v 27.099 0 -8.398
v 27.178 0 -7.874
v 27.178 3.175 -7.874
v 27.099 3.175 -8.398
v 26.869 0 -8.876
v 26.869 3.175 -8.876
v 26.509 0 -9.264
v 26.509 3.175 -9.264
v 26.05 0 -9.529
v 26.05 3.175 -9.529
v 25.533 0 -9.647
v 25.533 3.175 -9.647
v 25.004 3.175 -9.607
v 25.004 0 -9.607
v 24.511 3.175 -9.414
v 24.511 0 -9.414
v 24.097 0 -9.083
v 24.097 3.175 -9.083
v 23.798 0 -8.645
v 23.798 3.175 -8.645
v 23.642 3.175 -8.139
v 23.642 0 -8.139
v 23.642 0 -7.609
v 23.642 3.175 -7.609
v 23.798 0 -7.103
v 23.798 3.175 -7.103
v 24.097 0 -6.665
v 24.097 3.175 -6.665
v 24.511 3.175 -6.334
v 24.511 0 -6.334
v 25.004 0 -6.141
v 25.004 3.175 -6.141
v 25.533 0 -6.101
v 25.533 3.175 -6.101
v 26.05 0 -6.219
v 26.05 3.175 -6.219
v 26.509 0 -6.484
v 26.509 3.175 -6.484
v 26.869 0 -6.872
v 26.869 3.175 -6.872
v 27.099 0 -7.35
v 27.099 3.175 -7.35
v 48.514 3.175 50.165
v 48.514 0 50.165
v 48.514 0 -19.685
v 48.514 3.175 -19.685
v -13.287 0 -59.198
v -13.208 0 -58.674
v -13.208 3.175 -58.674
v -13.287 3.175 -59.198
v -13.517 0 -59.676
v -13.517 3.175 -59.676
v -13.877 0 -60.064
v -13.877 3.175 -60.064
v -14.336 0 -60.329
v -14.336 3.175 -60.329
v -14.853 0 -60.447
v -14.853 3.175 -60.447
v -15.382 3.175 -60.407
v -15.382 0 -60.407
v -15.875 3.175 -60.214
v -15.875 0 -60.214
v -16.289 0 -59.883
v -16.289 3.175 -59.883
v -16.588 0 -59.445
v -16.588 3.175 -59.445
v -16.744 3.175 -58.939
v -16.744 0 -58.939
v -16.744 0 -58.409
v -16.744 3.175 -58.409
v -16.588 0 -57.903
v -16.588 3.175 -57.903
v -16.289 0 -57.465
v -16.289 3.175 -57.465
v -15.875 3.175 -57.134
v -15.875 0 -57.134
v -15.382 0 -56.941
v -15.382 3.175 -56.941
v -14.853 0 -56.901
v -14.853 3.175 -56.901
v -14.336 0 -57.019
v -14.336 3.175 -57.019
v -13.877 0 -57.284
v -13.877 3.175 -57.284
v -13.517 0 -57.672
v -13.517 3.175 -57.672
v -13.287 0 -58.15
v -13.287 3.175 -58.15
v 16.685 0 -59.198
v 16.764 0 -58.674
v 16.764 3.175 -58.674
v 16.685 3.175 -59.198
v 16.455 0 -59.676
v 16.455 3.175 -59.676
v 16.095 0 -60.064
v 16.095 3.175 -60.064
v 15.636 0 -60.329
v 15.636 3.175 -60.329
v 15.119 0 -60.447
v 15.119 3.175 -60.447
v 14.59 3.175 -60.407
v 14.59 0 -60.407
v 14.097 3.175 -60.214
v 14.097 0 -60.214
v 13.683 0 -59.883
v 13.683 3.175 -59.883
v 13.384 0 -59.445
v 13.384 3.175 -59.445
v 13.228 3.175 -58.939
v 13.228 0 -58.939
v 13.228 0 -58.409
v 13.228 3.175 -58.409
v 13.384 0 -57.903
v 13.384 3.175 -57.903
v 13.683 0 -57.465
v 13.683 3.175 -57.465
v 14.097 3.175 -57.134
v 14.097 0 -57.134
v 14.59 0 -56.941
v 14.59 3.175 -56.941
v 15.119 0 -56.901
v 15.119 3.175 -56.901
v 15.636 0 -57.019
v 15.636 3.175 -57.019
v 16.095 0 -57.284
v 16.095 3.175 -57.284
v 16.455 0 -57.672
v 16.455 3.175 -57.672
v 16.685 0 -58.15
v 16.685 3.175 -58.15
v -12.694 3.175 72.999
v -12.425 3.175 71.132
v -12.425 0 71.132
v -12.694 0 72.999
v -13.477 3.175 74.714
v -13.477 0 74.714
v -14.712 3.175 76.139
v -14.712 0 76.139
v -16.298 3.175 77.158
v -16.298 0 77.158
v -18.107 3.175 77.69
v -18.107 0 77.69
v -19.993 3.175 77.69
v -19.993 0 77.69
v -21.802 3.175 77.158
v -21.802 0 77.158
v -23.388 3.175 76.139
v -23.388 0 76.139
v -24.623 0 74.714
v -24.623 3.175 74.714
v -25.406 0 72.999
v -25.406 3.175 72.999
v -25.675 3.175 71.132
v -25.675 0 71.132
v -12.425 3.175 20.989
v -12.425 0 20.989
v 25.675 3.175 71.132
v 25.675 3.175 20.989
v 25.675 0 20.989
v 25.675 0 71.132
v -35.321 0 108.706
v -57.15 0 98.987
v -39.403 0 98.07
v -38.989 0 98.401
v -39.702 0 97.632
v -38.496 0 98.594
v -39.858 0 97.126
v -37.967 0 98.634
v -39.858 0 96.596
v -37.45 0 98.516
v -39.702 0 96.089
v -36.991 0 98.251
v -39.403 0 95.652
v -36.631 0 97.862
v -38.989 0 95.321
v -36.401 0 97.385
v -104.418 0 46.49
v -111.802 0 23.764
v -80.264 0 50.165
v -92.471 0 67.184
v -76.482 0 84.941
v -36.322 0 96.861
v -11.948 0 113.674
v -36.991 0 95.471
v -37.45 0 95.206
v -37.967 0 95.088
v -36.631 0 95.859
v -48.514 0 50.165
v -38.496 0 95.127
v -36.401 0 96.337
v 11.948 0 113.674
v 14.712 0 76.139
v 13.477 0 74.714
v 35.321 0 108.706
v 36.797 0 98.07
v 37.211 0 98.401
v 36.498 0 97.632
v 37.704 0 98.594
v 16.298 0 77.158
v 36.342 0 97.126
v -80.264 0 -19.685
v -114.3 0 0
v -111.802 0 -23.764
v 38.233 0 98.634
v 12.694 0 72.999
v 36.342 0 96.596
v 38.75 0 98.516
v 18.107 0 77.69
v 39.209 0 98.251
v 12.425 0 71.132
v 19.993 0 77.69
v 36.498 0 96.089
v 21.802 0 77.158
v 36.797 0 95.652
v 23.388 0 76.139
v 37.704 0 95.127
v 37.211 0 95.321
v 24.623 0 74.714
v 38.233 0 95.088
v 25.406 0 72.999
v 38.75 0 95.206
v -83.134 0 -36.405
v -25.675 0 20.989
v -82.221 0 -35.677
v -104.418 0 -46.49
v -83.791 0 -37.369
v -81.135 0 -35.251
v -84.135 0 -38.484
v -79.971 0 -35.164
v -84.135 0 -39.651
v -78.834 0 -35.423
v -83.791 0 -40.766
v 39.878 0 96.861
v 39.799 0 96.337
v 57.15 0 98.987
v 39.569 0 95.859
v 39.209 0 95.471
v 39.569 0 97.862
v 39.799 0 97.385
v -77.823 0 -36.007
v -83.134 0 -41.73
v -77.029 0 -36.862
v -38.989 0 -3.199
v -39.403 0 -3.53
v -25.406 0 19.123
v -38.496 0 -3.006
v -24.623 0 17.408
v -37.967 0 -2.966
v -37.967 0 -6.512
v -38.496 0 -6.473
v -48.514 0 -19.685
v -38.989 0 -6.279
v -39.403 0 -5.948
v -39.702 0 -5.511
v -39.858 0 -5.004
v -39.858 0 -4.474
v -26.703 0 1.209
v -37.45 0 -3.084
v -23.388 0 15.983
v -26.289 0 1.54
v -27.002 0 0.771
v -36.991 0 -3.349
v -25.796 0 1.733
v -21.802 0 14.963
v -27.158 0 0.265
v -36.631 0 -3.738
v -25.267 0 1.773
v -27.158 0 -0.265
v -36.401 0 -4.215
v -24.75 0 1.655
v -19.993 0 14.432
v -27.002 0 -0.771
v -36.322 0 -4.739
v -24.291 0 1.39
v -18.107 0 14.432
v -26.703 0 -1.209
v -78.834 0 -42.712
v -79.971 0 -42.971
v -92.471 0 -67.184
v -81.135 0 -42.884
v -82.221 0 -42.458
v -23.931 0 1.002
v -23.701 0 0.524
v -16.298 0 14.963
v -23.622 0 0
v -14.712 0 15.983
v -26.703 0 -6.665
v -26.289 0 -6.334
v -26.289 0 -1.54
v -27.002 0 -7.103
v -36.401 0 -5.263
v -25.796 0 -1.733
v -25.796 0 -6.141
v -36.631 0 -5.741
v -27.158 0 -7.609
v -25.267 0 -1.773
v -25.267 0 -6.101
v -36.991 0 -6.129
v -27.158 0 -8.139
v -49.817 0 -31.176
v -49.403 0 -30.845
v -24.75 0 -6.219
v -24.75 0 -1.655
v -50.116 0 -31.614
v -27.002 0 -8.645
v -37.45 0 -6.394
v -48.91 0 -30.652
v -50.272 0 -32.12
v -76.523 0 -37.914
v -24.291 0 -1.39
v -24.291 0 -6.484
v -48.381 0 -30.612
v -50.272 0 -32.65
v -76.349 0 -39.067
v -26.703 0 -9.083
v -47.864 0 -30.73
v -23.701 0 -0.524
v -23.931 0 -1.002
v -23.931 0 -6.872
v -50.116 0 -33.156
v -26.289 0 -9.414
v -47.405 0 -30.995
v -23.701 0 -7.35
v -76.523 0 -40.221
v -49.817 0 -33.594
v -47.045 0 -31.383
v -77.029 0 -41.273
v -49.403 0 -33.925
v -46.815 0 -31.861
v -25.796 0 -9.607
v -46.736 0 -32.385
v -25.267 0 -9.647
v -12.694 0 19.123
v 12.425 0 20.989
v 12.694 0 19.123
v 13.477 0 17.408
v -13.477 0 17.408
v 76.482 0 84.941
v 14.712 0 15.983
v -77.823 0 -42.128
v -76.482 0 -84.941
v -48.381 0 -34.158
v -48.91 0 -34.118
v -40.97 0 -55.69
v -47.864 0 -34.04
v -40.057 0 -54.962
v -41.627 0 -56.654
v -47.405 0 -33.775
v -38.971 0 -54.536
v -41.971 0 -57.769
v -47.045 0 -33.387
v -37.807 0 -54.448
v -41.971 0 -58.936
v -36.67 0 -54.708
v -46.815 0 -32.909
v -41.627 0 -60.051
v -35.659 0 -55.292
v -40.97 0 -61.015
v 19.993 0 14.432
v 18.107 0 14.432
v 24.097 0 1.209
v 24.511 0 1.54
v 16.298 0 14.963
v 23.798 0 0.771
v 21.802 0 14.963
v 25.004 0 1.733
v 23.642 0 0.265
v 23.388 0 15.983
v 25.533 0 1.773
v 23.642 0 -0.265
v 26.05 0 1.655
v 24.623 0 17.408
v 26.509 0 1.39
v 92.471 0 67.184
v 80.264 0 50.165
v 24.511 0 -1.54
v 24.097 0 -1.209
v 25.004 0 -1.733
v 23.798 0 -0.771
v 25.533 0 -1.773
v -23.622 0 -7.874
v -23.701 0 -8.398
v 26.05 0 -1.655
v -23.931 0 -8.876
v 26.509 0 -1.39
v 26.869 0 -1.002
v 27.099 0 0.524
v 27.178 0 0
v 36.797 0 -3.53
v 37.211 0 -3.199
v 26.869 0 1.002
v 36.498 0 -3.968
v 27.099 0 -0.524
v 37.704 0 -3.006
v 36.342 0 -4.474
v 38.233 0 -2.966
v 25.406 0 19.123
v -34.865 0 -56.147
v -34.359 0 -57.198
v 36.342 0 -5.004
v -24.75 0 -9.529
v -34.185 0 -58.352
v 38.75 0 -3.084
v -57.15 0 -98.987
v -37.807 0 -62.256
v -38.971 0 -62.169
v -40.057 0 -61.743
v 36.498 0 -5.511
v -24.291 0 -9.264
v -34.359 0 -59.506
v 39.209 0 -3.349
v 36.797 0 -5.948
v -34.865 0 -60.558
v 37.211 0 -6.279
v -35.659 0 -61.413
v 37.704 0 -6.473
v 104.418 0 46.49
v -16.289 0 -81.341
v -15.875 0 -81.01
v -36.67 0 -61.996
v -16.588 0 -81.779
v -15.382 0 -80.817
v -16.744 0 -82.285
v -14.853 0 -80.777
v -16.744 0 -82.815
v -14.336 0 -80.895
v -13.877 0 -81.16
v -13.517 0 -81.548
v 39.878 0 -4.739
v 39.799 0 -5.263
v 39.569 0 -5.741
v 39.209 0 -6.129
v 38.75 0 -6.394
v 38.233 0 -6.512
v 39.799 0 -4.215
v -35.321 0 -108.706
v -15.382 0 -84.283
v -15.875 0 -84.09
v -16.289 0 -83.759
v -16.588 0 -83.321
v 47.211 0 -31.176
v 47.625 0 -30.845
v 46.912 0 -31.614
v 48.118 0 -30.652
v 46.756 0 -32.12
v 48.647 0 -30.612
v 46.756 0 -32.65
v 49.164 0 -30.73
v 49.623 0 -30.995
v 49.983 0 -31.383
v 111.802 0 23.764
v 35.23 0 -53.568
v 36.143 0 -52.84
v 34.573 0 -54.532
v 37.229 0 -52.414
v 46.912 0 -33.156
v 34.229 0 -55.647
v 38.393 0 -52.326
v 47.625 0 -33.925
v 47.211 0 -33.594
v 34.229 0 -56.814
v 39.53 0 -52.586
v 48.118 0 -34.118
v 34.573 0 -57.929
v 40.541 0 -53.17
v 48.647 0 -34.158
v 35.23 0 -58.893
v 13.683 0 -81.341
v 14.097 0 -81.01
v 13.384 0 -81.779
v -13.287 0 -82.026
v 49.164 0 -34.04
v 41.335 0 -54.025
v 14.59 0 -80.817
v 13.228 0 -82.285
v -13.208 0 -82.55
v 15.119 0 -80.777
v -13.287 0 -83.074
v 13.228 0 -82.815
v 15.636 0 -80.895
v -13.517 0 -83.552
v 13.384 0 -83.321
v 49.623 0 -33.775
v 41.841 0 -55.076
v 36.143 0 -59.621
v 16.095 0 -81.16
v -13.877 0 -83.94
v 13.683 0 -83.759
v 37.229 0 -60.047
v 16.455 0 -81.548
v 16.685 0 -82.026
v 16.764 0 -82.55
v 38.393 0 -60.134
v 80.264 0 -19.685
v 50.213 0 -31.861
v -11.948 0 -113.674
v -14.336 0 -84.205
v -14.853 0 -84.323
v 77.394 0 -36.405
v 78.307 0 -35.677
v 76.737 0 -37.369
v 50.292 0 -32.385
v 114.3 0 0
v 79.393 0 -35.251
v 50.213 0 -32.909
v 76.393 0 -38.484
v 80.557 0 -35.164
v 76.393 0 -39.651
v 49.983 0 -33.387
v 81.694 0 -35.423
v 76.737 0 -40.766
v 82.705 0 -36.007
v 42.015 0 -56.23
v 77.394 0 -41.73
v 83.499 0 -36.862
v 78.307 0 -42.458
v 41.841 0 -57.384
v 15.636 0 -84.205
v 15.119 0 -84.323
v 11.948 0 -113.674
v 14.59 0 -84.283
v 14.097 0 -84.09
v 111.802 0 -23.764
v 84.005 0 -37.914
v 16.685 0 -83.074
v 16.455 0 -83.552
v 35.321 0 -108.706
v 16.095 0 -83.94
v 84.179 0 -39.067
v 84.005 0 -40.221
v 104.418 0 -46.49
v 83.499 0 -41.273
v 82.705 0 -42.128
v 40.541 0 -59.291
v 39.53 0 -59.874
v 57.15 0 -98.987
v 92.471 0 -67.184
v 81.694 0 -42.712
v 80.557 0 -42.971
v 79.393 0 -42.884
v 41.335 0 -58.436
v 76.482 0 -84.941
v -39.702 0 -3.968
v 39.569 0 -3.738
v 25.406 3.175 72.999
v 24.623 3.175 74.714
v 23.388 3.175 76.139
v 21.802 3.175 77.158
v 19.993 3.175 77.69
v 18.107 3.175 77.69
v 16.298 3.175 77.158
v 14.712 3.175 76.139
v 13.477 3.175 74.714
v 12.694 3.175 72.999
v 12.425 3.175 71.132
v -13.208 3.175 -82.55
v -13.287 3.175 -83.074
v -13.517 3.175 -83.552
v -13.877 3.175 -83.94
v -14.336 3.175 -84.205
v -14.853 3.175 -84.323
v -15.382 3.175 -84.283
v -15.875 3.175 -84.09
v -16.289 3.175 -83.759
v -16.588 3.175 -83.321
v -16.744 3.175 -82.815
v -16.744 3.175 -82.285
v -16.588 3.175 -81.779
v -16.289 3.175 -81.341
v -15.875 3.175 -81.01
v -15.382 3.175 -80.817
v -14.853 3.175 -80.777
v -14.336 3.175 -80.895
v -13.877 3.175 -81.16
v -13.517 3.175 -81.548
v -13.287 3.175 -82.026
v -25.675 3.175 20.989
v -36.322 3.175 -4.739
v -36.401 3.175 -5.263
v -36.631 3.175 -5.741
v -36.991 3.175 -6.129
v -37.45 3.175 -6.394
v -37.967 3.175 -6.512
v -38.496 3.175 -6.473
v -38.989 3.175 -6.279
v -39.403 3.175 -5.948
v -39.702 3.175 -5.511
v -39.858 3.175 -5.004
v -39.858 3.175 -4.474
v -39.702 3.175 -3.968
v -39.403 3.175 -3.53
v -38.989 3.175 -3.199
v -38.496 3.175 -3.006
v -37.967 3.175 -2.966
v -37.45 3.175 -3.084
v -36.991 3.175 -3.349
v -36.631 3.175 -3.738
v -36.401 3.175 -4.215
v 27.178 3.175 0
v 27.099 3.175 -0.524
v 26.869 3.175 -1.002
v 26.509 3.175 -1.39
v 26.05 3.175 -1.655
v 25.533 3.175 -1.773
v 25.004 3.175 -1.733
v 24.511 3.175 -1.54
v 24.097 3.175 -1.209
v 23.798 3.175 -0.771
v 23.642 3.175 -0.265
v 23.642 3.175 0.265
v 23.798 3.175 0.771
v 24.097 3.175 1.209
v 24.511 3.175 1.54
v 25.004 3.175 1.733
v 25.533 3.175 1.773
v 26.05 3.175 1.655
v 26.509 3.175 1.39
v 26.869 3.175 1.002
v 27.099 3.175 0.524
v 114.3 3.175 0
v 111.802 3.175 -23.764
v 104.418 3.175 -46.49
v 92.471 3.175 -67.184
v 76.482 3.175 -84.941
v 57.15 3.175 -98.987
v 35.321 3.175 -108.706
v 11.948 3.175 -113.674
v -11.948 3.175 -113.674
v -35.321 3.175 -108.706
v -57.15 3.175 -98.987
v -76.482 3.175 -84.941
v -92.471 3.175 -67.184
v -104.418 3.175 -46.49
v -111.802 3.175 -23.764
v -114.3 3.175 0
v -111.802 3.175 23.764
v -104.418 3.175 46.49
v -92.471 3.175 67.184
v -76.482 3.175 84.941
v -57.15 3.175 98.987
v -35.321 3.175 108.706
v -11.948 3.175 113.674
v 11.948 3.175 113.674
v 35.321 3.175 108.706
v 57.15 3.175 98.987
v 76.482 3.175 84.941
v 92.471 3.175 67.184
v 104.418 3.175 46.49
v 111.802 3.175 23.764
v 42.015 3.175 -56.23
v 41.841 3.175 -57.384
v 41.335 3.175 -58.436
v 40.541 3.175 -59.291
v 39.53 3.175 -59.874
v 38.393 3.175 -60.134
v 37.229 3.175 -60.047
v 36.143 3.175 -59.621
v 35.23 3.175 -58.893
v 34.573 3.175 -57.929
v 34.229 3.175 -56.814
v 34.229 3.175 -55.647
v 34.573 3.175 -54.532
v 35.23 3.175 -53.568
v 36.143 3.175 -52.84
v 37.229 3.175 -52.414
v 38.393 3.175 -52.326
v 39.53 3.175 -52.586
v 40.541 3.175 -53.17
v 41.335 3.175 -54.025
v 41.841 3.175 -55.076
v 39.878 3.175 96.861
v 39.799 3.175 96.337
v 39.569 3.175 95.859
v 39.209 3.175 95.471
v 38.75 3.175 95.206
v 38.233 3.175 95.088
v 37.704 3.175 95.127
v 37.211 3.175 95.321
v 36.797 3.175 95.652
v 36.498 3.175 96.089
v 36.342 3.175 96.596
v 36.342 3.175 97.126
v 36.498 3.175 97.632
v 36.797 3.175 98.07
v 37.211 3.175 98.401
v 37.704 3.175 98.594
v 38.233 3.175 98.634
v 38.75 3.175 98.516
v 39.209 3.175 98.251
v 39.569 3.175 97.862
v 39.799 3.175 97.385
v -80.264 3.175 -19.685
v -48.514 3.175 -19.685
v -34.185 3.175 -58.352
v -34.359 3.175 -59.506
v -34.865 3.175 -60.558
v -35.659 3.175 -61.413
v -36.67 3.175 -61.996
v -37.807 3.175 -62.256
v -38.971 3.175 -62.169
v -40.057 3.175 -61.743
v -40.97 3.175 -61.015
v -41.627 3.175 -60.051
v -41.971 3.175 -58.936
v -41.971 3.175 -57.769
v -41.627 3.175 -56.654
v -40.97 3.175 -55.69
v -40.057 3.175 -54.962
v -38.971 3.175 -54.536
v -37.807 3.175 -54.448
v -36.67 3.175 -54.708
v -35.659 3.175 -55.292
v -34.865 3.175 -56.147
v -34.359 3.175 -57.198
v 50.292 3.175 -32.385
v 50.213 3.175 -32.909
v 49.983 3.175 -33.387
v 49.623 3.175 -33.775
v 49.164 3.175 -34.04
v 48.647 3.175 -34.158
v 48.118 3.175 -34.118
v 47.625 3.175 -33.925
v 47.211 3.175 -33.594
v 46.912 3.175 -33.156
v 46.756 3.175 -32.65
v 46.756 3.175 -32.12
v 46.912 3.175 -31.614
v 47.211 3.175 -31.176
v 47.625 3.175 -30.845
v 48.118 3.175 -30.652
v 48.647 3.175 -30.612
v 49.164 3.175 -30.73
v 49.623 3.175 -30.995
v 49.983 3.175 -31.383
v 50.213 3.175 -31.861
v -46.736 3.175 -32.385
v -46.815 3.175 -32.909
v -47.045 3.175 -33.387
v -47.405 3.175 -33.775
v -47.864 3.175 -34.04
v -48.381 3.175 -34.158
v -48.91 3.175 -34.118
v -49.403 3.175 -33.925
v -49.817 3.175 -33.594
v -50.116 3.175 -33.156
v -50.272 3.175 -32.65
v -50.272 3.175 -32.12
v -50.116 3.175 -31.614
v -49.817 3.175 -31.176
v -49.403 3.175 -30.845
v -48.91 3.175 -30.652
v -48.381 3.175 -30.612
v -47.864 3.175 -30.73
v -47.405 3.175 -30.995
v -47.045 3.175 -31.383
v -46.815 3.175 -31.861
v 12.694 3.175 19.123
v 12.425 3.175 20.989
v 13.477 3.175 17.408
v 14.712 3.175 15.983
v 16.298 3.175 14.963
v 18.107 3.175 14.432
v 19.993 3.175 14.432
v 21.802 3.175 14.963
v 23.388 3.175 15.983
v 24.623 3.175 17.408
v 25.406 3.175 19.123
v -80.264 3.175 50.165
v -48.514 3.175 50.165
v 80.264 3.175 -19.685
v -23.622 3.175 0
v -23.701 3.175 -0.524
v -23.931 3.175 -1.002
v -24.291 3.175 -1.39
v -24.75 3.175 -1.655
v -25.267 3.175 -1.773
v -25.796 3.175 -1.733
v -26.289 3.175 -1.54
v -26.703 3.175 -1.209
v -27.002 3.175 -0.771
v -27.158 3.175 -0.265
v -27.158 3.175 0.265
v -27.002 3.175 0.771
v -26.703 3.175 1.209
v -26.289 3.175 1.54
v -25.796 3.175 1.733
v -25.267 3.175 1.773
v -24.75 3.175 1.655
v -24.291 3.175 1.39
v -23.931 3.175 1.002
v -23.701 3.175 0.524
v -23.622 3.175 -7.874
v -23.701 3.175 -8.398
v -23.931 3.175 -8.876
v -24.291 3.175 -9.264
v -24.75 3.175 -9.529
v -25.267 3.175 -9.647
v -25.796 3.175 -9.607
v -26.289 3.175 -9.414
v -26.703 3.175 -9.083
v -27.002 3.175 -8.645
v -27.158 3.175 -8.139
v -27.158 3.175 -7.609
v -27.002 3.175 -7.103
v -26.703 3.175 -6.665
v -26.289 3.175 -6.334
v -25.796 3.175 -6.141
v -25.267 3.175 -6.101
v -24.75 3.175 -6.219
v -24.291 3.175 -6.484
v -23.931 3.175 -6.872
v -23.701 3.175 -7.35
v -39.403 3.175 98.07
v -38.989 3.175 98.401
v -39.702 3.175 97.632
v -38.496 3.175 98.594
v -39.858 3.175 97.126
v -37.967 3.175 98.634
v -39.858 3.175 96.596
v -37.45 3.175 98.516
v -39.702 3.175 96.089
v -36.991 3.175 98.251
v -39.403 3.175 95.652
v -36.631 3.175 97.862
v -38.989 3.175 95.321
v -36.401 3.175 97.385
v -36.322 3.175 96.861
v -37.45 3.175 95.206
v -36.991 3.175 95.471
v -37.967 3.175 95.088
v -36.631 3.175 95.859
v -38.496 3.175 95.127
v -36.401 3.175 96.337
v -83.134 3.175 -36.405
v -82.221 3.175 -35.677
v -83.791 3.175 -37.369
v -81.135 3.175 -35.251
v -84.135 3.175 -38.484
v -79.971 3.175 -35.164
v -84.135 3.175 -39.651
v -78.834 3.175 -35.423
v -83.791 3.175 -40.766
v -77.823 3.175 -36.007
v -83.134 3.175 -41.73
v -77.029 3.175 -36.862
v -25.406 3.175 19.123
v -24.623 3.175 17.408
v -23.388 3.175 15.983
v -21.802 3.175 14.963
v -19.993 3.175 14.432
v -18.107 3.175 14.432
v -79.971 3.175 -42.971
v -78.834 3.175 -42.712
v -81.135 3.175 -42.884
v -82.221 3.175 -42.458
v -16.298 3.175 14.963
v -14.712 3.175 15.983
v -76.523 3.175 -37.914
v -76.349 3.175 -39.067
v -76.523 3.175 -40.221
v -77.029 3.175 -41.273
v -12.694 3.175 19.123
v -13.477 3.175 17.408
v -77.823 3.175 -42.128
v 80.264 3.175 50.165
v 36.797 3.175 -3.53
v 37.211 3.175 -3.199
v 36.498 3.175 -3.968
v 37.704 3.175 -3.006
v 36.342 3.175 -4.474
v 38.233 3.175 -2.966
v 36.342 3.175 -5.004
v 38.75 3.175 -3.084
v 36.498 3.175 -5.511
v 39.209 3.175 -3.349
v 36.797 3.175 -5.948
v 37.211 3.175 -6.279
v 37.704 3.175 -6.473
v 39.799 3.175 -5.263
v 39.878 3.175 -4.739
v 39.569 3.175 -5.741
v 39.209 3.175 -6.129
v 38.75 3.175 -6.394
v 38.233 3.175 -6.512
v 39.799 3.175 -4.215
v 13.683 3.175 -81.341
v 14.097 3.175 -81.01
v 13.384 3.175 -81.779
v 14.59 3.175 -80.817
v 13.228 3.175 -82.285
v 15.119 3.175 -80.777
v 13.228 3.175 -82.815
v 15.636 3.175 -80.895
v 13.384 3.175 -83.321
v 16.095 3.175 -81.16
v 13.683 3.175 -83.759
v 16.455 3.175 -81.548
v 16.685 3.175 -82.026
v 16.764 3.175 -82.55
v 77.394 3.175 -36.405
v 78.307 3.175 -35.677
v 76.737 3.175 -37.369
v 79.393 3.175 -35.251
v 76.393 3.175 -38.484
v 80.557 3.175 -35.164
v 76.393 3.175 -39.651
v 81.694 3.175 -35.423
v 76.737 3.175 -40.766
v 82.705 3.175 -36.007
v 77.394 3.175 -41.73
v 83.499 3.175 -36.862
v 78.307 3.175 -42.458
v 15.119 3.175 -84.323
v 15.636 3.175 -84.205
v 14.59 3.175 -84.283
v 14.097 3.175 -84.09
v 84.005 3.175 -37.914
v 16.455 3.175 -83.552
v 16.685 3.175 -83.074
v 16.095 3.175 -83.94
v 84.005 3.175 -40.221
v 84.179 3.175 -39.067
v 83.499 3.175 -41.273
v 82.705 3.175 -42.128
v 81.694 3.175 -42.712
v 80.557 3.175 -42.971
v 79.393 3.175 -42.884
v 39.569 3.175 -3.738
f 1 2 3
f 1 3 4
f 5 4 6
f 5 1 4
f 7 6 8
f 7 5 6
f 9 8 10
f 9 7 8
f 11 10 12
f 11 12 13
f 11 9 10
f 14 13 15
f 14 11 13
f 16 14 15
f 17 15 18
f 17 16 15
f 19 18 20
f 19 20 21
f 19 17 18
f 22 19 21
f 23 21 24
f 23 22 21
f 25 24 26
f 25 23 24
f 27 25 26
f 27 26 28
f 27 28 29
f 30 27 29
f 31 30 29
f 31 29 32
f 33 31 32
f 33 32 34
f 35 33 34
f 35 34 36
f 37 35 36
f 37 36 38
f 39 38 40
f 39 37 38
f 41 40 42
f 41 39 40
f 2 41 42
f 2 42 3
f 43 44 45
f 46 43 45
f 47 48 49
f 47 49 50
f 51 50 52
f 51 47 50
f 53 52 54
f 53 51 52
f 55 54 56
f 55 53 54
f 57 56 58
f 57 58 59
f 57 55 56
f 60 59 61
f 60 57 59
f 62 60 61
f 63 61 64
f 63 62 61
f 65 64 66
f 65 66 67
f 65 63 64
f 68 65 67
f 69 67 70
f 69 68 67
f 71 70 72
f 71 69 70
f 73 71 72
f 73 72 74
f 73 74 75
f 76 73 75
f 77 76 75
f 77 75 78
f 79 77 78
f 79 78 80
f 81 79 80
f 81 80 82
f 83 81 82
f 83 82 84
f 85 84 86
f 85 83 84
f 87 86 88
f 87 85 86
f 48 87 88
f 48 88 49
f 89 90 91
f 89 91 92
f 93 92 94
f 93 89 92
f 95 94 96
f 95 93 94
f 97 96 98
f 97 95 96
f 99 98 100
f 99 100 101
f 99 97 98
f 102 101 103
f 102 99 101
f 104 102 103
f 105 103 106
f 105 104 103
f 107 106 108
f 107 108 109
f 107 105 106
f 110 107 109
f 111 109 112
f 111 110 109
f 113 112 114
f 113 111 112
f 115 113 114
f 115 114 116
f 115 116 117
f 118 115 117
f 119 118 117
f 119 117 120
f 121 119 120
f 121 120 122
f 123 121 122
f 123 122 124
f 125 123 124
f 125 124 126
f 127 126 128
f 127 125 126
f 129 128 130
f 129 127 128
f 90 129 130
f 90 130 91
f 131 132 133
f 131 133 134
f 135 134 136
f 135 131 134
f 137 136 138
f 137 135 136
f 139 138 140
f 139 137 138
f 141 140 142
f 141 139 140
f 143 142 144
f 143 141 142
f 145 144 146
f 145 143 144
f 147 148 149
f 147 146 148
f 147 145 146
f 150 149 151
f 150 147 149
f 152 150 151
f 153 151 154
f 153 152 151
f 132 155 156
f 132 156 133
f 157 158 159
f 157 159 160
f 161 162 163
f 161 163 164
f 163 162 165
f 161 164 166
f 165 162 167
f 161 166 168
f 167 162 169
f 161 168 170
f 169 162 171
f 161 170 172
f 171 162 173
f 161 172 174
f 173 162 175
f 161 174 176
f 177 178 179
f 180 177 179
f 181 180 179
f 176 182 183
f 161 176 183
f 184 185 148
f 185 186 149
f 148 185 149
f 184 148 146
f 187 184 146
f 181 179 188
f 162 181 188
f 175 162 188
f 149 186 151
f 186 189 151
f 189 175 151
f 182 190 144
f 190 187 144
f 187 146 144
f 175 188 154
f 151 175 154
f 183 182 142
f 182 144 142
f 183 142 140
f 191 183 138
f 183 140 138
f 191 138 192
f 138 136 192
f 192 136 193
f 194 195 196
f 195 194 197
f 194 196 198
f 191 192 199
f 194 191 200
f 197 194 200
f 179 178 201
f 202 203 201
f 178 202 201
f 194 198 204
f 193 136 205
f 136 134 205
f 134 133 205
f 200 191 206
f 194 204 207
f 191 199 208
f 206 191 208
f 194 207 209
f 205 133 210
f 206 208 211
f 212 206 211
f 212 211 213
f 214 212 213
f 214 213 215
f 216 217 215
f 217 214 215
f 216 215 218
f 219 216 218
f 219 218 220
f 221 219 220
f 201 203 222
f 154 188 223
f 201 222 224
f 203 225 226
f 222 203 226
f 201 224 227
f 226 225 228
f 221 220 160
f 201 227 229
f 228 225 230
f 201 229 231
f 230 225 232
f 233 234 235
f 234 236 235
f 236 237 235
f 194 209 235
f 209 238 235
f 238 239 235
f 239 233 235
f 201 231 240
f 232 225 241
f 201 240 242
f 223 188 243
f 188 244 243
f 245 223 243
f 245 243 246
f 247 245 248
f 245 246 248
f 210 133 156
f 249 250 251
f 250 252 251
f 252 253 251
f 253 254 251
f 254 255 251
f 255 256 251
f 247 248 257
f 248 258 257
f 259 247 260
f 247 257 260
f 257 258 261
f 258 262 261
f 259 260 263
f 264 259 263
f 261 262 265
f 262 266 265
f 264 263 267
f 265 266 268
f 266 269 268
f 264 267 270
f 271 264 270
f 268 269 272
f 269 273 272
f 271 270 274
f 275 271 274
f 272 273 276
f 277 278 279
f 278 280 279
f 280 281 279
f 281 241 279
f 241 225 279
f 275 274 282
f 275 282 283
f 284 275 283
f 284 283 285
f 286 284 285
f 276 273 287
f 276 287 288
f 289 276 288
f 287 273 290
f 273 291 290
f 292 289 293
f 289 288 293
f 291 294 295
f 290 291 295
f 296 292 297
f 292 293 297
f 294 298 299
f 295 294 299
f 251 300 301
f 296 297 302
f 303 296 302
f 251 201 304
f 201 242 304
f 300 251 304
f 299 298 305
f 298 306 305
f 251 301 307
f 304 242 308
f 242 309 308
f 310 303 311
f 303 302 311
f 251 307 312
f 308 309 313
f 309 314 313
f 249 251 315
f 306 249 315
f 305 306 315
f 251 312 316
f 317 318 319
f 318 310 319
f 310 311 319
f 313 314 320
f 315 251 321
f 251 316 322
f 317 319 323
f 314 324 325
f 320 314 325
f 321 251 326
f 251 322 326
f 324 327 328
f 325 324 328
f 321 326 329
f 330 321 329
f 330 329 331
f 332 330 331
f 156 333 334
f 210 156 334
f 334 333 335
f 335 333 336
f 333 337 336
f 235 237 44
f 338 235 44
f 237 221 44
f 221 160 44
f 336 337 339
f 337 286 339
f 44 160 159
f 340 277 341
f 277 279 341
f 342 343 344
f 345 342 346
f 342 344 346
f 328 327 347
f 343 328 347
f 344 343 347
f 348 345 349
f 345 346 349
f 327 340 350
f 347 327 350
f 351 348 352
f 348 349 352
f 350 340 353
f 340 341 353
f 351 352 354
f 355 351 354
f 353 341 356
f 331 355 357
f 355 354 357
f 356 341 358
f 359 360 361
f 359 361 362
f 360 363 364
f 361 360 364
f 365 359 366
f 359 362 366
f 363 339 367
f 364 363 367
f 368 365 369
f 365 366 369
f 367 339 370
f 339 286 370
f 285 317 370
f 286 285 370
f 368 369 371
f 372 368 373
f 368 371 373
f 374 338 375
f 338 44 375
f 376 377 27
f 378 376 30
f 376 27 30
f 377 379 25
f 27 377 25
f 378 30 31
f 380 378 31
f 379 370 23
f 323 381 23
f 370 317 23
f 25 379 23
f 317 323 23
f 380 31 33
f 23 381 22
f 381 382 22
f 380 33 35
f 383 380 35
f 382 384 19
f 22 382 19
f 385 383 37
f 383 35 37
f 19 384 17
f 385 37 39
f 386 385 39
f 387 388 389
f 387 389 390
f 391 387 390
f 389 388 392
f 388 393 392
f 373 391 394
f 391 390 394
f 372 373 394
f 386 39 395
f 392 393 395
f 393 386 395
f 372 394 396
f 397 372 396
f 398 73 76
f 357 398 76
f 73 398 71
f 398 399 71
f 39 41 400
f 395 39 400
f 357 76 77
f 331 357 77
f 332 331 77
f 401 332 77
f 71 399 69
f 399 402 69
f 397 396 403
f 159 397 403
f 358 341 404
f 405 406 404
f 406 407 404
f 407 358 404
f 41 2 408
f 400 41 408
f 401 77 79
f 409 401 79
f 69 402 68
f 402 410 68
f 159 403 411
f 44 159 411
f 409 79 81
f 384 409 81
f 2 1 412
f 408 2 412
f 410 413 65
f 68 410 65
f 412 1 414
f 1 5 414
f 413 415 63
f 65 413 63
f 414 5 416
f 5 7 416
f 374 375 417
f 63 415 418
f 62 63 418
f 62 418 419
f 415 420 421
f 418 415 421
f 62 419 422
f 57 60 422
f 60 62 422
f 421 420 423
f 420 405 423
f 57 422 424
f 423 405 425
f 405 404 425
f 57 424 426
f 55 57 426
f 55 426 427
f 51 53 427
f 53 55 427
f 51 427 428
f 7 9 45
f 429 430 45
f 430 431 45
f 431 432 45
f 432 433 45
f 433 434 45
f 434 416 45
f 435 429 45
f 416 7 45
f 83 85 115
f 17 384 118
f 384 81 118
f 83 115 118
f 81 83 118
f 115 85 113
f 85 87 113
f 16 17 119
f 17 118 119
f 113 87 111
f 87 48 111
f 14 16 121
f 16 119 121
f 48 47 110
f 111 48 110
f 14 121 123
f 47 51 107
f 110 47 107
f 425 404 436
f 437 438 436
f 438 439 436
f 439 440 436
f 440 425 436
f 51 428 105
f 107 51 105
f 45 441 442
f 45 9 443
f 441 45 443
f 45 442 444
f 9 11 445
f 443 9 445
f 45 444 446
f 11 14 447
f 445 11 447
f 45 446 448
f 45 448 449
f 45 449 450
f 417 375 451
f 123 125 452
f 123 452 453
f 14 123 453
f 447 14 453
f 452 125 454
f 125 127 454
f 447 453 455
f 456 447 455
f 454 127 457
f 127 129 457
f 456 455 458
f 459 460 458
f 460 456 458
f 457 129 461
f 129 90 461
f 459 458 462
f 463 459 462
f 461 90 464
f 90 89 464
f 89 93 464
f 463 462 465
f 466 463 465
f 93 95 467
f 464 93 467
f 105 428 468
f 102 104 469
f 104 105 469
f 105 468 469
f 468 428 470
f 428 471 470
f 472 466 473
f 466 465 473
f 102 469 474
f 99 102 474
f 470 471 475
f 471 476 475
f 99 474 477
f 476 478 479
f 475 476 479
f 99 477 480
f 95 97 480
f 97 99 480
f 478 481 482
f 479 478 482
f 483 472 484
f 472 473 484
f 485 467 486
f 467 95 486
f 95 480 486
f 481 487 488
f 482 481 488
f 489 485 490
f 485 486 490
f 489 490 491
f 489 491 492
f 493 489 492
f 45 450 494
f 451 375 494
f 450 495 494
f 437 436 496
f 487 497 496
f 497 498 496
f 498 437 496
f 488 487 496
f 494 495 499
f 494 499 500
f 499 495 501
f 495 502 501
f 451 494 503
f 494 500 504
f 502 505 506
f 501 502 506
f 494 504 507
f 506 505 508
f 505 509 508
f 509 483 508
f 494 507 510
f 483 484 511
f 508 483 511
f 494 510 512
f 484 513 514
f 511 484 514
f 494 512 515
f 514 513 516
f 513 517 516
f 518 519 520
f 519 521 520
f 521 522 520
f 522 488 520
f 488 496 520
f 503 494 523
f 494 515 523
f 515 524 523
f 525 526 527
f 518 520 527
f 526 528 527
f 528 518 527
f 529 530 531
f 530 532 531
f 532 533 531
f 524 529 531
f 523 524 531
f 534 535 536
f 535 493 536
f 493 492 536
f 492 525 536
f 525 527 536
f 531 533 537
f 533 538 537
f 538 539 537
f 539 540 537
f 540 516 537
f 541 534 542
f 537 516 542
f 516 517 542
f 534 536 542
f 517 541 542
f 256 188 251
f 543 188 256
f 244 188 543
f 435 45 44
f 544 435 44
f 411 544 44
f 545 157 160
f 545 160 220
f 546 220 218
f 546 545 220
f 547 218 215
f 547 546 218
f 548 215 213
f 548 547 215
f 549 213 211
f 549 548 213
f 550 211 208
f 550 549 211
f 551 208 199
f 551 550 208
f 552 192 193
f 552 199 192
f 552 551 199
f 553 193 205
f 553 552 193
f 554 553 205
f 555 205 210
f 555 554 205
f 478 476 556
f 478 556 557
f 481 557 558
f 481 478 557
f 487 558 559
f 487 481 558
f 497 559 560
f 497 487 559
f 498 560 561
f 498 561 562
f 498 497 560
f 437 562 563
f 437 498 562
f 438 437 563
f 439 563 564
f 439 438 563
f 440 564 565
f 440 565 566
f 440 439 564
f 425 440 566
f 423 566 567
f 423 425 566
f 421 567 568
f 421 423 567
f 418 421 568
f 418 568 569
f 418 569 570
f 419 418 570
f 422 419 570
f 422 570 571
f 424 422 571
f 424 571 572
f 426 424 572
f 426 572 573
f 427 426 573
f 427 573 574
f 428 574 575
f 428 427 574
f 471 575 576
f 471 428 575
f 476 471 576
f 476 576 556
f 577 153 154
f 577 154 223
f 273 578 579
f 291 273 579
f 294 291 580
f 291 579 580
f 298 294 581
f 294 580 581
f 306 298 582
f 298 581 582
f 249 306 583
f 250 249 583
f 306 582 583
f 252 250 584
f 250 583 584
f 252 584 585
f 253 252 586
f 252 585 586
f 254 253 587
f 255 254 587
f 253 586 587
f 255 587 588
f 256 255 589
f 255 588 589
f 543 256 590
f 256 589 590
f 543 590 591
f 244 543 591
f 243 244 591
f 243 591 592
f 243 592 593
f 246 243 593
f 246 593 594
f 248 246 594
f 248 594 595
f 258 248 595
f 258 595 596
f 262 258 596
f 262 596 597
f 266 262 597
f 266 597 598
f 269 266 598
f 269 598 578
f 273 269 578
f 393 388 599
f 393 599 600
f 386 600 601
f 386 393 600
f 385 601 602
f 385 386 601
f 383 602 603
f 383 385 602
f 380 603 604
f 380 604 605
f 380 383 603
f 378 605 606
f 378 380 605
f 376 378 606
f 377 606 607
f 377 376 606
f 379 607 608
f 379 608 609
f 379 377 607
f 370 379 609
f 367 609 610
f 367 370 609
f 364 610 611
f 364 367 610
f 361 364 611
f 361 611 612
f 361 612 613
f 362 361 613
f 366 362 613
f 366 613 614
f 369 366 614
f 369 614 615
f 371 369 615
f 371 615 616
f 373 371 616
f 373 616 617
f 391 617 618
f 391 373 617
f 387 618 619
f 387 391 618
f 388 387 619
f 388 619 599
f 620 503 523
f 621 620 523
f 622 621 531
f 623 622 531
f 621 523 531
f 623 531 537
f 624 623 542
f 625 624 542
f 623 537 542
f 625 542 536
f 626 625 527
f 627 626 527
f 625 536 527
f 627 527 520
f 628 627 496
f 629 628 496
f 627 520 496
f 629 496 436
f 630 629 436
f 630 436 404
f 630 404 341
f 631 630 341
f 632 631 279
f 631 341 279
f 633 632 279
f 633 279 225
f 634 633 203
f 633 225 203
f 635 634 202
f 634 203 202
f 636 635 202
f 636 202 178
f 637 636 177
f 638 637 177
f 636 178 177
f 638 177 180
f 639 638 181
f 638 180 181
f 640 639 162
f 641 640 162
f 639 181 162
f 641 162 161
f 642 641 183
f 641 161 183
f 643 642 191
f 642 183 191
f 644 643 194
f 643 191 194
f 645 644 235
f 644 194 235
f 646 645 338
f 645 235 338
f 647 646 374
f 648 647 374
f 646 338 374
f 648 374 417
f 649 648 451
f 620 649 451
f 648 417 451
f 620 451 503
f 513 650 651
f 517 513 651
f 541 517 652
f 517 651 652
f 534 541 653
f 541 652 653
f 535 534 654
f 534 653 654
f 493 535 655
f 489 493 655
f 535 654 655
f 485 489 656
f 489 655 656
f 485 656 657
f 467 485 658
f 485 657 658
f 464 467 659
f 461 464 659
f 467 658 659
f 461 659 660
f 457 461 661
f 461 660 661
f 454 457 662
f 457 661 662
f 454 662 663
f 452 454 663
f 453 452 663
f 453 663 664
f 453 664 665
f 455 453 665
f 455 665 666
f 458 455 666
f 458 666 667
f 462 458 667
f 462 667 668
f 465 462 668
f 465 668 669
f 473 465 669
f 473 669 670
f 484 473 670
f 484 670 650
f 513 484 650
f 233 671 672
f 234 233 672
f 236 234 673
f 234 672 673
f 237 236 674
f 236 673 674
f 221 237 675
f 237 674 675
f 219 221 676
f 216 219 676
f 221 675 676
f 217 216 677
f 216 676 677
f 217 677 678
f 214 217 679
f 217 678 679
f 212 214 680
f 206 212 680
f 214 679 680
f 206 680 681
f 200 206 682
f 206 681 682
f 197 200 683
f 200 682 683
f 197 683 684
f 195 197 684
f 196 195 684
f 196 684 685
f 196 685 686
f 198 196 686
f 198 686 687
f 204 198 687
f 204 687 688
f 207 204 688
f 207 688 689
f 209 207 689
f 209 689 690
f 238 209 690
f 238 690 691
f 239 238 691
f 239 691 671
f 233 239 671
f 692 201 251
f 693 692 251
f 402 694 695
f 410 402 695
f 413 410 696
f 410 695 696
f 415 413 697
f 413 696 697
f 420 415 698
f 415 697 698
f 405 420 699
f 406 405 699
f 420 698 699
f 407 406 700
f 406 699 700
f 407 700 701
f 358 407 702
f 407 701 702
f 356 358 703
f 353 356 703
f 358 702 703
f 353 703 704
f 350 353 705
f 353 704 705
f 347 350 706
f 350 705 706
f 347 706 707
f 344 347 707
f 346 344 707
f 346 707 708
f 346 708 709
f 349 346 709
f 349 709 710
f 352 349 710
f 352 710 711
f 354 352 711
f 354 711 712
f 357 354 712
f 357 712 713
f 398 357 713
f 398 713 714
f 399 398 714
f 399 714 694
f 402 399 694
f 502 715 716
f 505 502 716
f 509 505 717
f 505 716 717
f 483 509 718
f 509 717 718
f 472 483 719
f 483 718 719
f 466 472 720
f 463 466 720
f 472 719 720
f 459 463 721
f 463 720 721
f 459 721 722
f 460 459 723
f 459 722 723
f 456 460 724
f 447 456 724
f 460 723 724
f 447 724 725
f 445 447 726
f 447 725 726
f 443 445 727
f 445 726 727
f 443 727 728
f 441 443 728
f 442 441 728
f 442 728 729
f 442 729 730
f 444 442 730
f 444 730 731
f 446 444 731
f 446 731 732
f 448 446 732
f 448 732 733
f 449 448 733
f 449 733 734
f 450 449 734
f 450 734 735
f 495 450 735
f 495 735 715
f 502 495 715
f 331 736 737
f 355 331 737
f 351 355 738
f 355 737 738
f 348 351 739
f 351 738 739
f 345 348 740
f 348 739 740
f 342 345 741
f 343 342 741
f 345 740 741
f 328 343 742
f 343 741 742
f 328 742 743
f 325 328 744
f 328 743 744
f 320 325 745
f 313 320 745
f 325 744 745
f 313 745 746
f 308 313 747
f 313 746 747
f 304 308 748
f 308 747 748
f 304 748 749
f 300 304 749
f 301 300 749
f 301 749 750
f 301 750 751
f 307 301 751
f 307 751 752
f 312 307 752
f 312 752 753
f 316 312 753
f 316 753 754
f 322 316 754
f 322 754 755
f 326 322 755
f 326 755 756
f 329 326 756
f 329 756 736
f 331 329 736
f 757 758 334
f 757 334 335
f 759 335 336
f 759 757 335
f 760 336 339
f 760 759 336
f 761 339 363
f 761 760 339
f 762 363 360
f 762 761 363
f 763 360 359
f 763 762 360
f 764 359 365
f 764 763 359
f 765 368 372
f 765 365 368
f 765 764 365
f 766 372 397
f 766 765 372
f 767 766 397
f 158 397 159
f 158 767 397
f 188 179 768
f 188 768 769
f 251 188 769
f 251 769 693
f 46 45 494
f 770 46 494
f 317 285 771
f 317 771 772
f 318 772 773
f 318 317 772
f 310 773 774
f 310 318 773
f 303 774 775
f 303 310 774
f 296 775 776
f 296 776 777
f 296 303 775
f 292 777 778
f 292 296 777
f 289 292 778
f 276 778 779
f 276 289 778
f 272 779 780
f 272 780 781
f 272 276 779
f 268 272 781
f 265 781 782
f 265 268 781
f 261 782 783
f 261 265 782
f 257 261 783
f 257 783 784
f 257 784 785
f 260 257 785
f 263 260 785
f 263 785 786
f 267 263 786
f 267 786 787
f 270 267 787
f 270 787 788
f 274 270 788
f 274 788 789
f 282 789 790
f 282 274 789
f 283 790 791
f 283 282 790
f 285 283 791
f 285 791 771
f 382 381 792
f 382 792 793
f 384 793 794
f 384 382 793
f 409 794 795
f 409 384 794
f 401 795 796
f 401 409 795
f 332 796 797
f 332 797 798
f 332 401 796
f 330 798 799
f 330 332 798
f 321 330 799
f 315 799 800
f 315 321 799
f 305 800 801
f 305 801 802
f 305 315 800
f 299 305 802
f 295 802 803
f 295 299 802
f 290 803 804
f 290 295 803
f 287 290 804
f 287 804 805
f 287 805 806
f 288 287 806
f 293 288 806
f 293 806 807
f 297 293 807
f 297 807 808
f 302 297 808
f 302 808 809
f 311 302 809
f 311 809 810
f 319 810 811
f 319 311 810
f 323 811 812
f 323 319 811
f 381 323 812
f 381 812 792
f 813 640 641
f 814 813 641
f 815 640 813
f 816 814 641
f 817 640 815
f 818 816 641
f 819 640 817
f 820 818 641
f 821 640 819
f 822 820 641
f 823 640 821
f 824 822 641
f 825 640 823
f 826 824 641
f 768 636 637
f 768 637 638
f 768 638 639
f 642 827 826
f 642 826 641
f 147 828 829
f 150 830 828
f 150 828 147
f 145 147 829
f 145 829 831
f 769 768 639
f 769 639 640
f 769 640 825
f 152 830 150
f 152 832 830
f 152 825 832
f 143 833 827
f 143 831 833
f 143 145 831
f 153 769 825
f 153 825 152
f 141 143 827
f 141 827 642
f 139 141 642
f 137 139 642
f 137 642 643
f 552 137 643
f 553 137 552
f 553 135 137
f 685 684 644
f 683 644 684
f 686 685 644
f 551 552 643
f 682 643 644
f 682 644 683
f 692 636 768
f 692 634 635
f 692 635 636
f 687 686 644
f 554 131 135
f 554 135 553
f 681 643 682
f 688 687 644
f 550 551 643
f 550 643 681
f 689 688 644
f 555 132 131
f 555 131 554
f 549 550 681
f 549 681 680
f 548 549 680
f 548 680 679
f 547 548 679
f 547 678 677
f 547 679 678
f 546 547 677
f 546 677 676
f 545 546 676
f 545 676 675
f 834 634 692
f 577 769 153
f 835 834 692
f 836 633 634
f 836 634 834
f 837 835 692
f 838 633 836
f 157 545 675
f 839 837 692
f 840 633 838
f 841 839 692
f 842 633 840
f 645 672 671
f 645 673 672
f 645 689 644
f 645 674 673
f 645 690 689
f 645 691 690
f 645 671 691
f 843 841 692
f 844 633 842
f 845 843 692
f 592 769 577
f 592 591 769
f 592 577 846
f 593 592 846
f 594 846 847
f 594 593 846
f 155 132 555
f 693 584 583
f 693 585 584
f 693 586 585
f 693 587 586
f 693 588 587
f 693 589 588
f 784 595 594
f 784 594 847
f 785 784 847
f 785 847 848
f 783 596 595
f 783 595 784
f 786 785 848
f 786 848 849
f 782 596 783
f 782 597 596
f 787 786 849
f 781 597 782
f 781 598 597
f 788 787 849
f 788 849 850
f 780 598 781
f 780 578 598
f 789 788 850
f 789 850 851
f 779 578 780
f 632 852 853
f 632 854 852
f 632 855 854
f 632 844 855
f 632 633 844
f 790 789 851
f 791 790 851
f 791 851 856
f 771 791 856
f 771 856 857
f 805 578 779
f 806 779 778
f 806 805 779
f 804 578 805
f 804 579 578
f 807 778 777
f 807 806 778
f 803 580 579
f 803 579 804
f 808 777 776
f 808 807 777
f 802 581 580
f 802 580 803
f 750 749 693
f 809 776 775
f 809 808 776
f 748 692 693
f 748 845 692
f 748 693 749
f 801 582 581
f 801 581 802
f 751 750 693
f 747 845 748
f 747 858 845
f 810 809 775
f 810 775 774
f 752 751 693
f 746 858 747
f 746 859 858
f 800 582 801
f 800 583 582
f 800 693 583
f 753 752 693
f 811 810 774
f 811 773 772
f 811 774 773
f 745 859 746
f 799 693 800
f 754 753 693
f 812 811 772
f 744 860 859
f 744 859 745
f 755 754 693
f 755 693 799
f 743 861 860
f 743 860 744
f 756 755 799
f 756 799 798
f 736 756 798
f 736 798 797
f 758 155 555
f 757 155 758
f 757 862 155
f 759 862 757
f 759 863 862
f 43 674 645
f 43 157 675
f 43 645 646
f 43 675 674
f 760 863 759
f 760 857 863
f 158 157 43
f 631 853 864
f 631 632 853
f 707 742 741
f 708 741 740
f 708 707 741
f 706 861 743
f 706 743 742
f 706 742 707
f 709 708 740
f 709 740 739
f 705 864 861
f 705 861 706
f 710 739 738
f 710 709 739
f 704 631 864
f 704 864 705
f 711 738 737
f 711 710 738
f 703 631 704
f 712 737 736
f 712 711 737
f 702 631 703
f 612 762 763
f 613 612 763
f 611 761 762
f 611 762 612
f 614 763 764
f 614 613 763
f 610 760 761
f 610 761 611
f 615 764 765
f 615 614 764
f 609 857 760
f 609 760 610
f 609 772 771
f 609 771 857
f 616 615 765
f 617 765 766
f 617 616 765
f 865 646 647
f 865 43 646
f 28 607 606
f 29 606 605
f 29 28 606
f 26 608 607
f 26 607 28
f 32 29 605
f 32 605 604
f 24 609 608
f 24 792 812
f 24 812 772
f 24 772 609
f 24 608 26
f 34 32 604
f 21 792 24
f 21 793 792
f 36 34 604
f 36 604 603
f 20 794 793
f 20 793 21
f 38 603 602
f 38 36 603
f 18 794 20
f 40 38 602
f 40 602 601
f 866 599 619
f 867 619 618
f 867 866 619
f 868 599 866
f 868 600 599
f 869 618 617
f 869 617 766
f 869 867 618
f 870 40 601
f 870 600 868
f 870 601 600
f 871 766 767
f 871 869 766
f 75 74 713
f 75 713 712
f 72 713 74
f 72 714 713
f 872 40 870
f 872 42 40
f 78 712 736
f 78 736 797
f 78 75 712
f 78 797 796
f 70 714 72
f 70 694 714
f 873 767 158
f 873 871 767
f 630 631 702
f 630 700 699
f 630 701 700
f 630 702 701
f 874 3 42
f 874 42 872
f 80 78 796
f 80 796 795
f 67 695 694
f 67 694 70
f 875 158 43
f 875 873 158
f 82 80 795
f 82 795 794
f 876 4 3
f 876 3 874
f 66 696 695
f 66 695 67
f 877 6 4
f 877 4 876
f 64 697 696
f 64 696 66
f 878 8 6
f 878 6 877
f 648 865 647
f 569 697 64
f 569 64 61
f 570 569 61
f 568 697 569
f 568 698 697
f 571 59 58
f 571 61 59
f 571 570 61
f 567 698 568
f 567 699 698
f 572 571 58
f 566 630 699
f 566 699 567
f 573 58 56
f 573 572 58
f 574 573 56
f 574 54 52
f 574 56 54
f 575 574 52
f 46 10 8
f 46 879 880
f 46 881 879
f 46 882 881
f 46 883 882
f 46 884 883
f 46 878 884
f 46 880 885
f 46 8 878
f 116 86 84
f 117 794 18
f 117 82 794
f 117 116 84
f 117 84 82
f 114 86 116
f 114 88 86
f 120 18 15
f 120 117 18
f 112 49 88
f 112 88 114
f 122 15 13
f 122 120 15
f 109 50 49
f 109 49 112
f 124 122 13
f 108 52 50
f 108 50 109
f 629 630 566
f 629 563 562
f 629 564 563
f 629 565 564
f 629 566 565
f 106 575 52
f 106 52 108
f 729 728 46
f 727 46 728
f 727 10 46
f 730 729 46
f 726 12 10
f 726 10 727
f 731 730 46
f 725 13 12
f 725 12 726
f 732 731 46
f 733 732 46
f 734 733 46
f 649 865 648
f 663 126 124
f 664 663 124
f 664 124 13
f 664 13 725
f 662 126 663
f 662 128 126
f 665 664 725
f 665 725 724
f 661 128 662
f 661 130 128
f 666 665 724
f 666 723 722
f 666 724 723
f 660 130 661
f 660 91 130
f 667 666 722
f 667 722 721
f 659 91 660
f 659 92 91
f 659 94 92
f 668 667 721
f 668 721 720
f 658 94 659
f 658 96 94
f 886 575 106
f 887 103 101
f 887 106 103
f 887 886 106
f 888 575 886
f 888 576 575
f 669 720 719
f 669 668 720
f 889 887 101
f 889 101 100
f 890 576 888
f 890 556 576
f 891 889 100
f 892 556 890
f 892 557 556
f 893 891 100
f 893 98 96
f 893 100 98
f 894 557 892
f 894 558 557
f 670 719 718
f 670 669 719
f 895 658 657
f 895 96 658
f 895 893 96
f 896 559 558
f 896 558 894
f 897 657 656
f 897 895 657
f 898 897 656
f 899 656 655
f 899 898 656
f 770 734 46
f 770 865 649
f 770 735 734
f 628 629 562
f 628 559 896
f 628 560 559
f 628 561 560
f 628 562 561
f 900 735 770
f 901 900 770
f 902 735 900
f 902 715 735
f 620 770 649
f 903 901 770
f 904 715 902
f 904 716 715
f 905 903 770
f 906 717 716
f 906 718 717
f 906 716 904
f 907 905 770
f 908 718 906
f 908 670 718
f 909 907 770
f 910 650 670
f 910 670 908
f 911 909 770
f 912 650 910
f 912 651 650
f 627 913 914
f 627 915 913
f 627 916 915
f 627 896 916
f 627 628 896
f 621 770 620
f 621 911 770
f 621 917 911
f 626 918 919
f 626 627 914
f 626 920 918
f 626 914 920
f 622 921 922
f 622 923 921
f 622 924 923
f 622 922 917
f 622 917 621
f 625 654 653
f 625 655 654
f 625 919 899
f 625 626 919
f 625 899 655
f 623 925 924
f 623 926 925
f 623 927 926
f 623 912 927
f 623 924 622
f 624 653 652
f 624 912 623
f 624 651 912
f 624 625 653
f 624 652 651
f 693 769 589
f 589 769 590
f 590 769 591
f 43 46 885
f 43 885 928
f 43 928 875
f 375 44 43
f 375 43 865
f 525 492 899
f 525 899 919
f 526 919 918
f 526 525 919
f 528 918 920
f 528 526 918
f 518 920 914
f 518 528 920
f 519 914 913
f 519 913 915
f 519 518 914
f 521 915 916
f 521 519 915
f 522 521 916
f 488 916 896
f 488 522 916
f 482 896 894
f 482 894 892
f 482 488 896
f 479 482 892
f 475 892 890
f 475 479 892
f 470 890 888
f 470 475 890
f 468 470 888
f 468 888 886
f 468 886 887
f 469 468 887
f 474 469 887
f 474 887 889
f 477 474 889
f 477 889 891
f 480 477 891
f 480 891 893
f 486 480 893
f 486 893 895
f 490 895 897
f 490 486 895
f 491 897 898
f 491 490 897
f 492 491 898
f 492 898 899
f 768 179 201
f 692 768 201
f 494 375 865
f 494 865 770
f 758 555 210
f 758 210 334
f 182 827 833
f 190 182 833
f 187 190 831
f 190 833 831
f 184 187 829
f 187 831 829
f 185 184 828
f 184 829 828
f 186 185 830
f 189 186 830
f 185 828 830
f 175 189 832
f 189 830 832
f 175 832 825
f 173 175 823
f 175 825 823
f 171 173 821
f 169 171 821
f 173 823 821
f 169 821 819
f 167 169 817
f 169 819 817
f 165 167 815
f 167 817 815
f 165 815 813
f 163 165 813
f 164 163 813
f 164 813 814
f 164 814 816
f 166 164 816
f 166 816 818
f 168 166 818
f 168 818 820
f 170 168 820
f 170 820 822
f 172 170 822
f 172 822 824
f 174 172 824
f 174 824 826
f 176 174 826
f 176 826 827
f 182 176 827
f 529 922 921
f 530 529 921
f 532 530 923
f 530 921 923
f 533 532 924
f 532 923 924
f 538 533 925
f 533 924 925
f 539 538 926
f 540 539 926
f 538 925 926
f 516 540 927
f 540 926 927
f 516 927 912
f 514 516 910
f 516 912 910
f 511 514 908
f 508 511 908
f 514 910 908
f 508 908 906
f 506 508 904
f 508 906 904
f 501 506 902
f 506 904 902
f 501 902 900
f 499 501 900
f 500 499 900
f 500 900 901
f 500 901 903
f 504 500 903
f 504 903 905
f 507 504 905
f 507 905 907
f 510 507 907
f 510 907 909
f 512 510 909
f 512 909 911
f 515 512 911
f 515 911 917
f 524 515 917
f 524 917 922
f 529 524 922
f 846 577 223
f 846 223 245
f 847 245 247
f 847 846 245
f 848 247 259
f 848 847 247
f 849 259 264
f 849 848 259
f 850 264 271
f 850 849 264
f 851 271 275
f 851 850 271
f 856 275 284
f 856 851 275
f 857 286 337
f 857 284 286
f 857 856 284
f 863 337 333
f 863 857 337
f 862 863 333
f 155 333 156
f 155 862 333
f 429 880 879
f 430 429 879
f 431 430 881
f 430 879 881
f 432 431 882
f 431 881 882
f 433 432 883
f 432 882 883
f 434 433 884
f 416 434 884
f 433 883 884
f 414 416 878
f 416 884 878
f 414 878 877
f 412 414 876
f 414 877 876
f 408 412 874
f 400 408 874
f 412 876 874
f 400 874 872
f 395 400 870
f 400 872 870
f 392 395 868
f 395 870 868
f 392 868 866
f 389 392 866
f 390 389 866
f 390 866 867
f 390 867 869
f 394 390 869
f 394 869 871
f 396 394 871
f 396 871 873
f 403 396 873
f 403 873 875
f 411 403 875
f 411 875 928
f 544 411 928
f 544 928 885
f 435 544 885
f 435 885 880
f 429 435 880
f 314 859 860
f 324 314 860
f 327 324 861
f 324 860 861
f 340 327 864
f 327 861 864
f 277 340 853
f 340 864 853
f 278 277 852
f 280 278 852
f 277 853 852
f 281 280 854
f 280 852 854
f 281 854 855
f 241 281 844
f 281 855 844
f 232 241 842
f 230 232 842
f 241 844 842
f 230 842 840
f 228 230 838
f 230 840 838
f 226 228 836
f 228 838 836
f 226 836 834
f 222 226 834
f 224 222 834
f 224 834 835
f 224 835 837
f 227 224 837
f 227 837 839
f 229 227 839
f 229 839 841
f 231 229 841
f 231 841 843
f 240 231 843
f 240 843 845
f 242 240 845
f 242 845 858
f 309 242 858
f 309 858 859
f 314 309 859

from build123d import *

# Parameters (mm, degrees)
SKETCH1_R           = 114.3
SKETCH1_R_2         = 1.778
SKETCH1_W           = 31.75
SKETCH1_H           = 69.85
BOSS_EXTRUDE1_DEPTH = 3.175
SKETCH2_R           = 1.778
SKETCH2_R_2         = 3.914780109
CUT_EXTRUDE1_DEPTH  = 25.4


with BuildPart() as part:
    # Sketch1 → Boss-Extrude1 (new body)
    with BuildSketch(Plane(origin=(0, 0, 0), x_dir=(1, 0, 0), z_dir=(0, 1, 0))):
        Circle(SKETCH1_R)
        with Locations((-14.986, 82.55)):
            Circle(SKETCH1_R_2, mode=Mode.SUBTRACT)
        with Locations((14.986, 82.55)):
            Circle(SKETCH1_R_2, mode=Mode.SUBTRACT)
        with Locations((-14.986, 58.674)):
            Circle(SKETCH1_R_2, mode=Mode.SUBTRACT)
        with Locations((14.986, 58.674)):
            Circle(SKETCH1_R_2, mode=Mode.SUBTRACT)
        with Locations((25.4, 7.874)):
            Circle(SKETCH1_R_2, mode=Mode.SUBTRACT)
        with Locations((25.4, 0)):
            Circle(SKETCH1_R_2, mode=Mode.SUBTRACT)
        with Locations((-25.4, 7.874)):
            Circle(SKETCH1_R_2, mode=Mode.SUBTRACT)
        with Locations((-25.4, 0)):
            Circle(SKETCH1_R_2, mode=Mode.SUBTRACT)
        with Locations((64.389, -15.24)):
            Rectangle(SKETCH1_W, SKETCH1_H, mode=Mode.SUBTRACT)
        with Locations((-64.389, -15.24)):
            Rectangle(SKETCH1_W, SKETCH1_H, mode=Mode.SUBTRACT)
    extrude(amount=BOSS_EXTRUDE1_DEPTH)

    # Sketch2 → Cut-Extrude1 (cut)
    with BuildSketch(Plane(origin=(0, 3.175, 0), x_dir=(1, 0, 0), z_dir=(0, 1, 0))):
        with Locations((-48.514, 32.385)):
            Circle(SKETCH2_R)
        with Locations((48.514, 32.385)):
            Circle(SKETCH2_R)
        with Locations((38.1, 4.739101121)):
            Circle(SKETCH2_R)
        with Locations((-38.1, 4.739101121)):
            Circle(SKETCH2_R)
        with Locations((-38.1, -96.860898879)):
            Circle(SKETCH2_R)
        with Locations((38.1, -96.860898879)):
            Circle(SKETCH2_R)
        with Locations((-38.1, 58.35227567)):
            Circle(SKETCH2_R_2)
        with Locations((38.1, 56.230319403)):
            Circle(SKETCH2_R_2)
        with Locations((80.264, 39.067487207)):
            Circle(SKETCH2_R_2)
        with Locations((-80.264, 39.067487207)):
            Circle(SKETCH2_R_2)
        with BuildLine():
            Line((-25.674625229, -71.132444692), (-25.674625229, -20.989353066))
            ThreePointArc((-25.674625229, -20.989353066), (-19.05, -14.364727837), (-12.425374771, -20.989353066))
            Line((-12.425374771, -20.989353066), (-12.425374771, -71.132444692))
            ThreePointArc((-12.425374771, -71.132444692), (-19.05, -77.757069921), (-25.674625229, -71.132444692))
        make_face()
        with BuildLine():
            Line((12.425374771, -71.132444692), (12.425374771, -20.989353066))
            ThreePointArc((12.425374771, -20.989353066), (19.05, -14.364727837), (25.674625229, -20.989353066))
            Line((25.674625229, -20.989353066), (25.674625229, -71.132444692))
            ThreePointArc((25.674625229, -71.132444692), (19.05, -77.757069921), (12.425374771, -71.132444692))
        make_face()
    extrude(amount=-CUT_EXTRUDE1_DEPTH, mode=Mode.SUBTRACT)


solid = part.part
